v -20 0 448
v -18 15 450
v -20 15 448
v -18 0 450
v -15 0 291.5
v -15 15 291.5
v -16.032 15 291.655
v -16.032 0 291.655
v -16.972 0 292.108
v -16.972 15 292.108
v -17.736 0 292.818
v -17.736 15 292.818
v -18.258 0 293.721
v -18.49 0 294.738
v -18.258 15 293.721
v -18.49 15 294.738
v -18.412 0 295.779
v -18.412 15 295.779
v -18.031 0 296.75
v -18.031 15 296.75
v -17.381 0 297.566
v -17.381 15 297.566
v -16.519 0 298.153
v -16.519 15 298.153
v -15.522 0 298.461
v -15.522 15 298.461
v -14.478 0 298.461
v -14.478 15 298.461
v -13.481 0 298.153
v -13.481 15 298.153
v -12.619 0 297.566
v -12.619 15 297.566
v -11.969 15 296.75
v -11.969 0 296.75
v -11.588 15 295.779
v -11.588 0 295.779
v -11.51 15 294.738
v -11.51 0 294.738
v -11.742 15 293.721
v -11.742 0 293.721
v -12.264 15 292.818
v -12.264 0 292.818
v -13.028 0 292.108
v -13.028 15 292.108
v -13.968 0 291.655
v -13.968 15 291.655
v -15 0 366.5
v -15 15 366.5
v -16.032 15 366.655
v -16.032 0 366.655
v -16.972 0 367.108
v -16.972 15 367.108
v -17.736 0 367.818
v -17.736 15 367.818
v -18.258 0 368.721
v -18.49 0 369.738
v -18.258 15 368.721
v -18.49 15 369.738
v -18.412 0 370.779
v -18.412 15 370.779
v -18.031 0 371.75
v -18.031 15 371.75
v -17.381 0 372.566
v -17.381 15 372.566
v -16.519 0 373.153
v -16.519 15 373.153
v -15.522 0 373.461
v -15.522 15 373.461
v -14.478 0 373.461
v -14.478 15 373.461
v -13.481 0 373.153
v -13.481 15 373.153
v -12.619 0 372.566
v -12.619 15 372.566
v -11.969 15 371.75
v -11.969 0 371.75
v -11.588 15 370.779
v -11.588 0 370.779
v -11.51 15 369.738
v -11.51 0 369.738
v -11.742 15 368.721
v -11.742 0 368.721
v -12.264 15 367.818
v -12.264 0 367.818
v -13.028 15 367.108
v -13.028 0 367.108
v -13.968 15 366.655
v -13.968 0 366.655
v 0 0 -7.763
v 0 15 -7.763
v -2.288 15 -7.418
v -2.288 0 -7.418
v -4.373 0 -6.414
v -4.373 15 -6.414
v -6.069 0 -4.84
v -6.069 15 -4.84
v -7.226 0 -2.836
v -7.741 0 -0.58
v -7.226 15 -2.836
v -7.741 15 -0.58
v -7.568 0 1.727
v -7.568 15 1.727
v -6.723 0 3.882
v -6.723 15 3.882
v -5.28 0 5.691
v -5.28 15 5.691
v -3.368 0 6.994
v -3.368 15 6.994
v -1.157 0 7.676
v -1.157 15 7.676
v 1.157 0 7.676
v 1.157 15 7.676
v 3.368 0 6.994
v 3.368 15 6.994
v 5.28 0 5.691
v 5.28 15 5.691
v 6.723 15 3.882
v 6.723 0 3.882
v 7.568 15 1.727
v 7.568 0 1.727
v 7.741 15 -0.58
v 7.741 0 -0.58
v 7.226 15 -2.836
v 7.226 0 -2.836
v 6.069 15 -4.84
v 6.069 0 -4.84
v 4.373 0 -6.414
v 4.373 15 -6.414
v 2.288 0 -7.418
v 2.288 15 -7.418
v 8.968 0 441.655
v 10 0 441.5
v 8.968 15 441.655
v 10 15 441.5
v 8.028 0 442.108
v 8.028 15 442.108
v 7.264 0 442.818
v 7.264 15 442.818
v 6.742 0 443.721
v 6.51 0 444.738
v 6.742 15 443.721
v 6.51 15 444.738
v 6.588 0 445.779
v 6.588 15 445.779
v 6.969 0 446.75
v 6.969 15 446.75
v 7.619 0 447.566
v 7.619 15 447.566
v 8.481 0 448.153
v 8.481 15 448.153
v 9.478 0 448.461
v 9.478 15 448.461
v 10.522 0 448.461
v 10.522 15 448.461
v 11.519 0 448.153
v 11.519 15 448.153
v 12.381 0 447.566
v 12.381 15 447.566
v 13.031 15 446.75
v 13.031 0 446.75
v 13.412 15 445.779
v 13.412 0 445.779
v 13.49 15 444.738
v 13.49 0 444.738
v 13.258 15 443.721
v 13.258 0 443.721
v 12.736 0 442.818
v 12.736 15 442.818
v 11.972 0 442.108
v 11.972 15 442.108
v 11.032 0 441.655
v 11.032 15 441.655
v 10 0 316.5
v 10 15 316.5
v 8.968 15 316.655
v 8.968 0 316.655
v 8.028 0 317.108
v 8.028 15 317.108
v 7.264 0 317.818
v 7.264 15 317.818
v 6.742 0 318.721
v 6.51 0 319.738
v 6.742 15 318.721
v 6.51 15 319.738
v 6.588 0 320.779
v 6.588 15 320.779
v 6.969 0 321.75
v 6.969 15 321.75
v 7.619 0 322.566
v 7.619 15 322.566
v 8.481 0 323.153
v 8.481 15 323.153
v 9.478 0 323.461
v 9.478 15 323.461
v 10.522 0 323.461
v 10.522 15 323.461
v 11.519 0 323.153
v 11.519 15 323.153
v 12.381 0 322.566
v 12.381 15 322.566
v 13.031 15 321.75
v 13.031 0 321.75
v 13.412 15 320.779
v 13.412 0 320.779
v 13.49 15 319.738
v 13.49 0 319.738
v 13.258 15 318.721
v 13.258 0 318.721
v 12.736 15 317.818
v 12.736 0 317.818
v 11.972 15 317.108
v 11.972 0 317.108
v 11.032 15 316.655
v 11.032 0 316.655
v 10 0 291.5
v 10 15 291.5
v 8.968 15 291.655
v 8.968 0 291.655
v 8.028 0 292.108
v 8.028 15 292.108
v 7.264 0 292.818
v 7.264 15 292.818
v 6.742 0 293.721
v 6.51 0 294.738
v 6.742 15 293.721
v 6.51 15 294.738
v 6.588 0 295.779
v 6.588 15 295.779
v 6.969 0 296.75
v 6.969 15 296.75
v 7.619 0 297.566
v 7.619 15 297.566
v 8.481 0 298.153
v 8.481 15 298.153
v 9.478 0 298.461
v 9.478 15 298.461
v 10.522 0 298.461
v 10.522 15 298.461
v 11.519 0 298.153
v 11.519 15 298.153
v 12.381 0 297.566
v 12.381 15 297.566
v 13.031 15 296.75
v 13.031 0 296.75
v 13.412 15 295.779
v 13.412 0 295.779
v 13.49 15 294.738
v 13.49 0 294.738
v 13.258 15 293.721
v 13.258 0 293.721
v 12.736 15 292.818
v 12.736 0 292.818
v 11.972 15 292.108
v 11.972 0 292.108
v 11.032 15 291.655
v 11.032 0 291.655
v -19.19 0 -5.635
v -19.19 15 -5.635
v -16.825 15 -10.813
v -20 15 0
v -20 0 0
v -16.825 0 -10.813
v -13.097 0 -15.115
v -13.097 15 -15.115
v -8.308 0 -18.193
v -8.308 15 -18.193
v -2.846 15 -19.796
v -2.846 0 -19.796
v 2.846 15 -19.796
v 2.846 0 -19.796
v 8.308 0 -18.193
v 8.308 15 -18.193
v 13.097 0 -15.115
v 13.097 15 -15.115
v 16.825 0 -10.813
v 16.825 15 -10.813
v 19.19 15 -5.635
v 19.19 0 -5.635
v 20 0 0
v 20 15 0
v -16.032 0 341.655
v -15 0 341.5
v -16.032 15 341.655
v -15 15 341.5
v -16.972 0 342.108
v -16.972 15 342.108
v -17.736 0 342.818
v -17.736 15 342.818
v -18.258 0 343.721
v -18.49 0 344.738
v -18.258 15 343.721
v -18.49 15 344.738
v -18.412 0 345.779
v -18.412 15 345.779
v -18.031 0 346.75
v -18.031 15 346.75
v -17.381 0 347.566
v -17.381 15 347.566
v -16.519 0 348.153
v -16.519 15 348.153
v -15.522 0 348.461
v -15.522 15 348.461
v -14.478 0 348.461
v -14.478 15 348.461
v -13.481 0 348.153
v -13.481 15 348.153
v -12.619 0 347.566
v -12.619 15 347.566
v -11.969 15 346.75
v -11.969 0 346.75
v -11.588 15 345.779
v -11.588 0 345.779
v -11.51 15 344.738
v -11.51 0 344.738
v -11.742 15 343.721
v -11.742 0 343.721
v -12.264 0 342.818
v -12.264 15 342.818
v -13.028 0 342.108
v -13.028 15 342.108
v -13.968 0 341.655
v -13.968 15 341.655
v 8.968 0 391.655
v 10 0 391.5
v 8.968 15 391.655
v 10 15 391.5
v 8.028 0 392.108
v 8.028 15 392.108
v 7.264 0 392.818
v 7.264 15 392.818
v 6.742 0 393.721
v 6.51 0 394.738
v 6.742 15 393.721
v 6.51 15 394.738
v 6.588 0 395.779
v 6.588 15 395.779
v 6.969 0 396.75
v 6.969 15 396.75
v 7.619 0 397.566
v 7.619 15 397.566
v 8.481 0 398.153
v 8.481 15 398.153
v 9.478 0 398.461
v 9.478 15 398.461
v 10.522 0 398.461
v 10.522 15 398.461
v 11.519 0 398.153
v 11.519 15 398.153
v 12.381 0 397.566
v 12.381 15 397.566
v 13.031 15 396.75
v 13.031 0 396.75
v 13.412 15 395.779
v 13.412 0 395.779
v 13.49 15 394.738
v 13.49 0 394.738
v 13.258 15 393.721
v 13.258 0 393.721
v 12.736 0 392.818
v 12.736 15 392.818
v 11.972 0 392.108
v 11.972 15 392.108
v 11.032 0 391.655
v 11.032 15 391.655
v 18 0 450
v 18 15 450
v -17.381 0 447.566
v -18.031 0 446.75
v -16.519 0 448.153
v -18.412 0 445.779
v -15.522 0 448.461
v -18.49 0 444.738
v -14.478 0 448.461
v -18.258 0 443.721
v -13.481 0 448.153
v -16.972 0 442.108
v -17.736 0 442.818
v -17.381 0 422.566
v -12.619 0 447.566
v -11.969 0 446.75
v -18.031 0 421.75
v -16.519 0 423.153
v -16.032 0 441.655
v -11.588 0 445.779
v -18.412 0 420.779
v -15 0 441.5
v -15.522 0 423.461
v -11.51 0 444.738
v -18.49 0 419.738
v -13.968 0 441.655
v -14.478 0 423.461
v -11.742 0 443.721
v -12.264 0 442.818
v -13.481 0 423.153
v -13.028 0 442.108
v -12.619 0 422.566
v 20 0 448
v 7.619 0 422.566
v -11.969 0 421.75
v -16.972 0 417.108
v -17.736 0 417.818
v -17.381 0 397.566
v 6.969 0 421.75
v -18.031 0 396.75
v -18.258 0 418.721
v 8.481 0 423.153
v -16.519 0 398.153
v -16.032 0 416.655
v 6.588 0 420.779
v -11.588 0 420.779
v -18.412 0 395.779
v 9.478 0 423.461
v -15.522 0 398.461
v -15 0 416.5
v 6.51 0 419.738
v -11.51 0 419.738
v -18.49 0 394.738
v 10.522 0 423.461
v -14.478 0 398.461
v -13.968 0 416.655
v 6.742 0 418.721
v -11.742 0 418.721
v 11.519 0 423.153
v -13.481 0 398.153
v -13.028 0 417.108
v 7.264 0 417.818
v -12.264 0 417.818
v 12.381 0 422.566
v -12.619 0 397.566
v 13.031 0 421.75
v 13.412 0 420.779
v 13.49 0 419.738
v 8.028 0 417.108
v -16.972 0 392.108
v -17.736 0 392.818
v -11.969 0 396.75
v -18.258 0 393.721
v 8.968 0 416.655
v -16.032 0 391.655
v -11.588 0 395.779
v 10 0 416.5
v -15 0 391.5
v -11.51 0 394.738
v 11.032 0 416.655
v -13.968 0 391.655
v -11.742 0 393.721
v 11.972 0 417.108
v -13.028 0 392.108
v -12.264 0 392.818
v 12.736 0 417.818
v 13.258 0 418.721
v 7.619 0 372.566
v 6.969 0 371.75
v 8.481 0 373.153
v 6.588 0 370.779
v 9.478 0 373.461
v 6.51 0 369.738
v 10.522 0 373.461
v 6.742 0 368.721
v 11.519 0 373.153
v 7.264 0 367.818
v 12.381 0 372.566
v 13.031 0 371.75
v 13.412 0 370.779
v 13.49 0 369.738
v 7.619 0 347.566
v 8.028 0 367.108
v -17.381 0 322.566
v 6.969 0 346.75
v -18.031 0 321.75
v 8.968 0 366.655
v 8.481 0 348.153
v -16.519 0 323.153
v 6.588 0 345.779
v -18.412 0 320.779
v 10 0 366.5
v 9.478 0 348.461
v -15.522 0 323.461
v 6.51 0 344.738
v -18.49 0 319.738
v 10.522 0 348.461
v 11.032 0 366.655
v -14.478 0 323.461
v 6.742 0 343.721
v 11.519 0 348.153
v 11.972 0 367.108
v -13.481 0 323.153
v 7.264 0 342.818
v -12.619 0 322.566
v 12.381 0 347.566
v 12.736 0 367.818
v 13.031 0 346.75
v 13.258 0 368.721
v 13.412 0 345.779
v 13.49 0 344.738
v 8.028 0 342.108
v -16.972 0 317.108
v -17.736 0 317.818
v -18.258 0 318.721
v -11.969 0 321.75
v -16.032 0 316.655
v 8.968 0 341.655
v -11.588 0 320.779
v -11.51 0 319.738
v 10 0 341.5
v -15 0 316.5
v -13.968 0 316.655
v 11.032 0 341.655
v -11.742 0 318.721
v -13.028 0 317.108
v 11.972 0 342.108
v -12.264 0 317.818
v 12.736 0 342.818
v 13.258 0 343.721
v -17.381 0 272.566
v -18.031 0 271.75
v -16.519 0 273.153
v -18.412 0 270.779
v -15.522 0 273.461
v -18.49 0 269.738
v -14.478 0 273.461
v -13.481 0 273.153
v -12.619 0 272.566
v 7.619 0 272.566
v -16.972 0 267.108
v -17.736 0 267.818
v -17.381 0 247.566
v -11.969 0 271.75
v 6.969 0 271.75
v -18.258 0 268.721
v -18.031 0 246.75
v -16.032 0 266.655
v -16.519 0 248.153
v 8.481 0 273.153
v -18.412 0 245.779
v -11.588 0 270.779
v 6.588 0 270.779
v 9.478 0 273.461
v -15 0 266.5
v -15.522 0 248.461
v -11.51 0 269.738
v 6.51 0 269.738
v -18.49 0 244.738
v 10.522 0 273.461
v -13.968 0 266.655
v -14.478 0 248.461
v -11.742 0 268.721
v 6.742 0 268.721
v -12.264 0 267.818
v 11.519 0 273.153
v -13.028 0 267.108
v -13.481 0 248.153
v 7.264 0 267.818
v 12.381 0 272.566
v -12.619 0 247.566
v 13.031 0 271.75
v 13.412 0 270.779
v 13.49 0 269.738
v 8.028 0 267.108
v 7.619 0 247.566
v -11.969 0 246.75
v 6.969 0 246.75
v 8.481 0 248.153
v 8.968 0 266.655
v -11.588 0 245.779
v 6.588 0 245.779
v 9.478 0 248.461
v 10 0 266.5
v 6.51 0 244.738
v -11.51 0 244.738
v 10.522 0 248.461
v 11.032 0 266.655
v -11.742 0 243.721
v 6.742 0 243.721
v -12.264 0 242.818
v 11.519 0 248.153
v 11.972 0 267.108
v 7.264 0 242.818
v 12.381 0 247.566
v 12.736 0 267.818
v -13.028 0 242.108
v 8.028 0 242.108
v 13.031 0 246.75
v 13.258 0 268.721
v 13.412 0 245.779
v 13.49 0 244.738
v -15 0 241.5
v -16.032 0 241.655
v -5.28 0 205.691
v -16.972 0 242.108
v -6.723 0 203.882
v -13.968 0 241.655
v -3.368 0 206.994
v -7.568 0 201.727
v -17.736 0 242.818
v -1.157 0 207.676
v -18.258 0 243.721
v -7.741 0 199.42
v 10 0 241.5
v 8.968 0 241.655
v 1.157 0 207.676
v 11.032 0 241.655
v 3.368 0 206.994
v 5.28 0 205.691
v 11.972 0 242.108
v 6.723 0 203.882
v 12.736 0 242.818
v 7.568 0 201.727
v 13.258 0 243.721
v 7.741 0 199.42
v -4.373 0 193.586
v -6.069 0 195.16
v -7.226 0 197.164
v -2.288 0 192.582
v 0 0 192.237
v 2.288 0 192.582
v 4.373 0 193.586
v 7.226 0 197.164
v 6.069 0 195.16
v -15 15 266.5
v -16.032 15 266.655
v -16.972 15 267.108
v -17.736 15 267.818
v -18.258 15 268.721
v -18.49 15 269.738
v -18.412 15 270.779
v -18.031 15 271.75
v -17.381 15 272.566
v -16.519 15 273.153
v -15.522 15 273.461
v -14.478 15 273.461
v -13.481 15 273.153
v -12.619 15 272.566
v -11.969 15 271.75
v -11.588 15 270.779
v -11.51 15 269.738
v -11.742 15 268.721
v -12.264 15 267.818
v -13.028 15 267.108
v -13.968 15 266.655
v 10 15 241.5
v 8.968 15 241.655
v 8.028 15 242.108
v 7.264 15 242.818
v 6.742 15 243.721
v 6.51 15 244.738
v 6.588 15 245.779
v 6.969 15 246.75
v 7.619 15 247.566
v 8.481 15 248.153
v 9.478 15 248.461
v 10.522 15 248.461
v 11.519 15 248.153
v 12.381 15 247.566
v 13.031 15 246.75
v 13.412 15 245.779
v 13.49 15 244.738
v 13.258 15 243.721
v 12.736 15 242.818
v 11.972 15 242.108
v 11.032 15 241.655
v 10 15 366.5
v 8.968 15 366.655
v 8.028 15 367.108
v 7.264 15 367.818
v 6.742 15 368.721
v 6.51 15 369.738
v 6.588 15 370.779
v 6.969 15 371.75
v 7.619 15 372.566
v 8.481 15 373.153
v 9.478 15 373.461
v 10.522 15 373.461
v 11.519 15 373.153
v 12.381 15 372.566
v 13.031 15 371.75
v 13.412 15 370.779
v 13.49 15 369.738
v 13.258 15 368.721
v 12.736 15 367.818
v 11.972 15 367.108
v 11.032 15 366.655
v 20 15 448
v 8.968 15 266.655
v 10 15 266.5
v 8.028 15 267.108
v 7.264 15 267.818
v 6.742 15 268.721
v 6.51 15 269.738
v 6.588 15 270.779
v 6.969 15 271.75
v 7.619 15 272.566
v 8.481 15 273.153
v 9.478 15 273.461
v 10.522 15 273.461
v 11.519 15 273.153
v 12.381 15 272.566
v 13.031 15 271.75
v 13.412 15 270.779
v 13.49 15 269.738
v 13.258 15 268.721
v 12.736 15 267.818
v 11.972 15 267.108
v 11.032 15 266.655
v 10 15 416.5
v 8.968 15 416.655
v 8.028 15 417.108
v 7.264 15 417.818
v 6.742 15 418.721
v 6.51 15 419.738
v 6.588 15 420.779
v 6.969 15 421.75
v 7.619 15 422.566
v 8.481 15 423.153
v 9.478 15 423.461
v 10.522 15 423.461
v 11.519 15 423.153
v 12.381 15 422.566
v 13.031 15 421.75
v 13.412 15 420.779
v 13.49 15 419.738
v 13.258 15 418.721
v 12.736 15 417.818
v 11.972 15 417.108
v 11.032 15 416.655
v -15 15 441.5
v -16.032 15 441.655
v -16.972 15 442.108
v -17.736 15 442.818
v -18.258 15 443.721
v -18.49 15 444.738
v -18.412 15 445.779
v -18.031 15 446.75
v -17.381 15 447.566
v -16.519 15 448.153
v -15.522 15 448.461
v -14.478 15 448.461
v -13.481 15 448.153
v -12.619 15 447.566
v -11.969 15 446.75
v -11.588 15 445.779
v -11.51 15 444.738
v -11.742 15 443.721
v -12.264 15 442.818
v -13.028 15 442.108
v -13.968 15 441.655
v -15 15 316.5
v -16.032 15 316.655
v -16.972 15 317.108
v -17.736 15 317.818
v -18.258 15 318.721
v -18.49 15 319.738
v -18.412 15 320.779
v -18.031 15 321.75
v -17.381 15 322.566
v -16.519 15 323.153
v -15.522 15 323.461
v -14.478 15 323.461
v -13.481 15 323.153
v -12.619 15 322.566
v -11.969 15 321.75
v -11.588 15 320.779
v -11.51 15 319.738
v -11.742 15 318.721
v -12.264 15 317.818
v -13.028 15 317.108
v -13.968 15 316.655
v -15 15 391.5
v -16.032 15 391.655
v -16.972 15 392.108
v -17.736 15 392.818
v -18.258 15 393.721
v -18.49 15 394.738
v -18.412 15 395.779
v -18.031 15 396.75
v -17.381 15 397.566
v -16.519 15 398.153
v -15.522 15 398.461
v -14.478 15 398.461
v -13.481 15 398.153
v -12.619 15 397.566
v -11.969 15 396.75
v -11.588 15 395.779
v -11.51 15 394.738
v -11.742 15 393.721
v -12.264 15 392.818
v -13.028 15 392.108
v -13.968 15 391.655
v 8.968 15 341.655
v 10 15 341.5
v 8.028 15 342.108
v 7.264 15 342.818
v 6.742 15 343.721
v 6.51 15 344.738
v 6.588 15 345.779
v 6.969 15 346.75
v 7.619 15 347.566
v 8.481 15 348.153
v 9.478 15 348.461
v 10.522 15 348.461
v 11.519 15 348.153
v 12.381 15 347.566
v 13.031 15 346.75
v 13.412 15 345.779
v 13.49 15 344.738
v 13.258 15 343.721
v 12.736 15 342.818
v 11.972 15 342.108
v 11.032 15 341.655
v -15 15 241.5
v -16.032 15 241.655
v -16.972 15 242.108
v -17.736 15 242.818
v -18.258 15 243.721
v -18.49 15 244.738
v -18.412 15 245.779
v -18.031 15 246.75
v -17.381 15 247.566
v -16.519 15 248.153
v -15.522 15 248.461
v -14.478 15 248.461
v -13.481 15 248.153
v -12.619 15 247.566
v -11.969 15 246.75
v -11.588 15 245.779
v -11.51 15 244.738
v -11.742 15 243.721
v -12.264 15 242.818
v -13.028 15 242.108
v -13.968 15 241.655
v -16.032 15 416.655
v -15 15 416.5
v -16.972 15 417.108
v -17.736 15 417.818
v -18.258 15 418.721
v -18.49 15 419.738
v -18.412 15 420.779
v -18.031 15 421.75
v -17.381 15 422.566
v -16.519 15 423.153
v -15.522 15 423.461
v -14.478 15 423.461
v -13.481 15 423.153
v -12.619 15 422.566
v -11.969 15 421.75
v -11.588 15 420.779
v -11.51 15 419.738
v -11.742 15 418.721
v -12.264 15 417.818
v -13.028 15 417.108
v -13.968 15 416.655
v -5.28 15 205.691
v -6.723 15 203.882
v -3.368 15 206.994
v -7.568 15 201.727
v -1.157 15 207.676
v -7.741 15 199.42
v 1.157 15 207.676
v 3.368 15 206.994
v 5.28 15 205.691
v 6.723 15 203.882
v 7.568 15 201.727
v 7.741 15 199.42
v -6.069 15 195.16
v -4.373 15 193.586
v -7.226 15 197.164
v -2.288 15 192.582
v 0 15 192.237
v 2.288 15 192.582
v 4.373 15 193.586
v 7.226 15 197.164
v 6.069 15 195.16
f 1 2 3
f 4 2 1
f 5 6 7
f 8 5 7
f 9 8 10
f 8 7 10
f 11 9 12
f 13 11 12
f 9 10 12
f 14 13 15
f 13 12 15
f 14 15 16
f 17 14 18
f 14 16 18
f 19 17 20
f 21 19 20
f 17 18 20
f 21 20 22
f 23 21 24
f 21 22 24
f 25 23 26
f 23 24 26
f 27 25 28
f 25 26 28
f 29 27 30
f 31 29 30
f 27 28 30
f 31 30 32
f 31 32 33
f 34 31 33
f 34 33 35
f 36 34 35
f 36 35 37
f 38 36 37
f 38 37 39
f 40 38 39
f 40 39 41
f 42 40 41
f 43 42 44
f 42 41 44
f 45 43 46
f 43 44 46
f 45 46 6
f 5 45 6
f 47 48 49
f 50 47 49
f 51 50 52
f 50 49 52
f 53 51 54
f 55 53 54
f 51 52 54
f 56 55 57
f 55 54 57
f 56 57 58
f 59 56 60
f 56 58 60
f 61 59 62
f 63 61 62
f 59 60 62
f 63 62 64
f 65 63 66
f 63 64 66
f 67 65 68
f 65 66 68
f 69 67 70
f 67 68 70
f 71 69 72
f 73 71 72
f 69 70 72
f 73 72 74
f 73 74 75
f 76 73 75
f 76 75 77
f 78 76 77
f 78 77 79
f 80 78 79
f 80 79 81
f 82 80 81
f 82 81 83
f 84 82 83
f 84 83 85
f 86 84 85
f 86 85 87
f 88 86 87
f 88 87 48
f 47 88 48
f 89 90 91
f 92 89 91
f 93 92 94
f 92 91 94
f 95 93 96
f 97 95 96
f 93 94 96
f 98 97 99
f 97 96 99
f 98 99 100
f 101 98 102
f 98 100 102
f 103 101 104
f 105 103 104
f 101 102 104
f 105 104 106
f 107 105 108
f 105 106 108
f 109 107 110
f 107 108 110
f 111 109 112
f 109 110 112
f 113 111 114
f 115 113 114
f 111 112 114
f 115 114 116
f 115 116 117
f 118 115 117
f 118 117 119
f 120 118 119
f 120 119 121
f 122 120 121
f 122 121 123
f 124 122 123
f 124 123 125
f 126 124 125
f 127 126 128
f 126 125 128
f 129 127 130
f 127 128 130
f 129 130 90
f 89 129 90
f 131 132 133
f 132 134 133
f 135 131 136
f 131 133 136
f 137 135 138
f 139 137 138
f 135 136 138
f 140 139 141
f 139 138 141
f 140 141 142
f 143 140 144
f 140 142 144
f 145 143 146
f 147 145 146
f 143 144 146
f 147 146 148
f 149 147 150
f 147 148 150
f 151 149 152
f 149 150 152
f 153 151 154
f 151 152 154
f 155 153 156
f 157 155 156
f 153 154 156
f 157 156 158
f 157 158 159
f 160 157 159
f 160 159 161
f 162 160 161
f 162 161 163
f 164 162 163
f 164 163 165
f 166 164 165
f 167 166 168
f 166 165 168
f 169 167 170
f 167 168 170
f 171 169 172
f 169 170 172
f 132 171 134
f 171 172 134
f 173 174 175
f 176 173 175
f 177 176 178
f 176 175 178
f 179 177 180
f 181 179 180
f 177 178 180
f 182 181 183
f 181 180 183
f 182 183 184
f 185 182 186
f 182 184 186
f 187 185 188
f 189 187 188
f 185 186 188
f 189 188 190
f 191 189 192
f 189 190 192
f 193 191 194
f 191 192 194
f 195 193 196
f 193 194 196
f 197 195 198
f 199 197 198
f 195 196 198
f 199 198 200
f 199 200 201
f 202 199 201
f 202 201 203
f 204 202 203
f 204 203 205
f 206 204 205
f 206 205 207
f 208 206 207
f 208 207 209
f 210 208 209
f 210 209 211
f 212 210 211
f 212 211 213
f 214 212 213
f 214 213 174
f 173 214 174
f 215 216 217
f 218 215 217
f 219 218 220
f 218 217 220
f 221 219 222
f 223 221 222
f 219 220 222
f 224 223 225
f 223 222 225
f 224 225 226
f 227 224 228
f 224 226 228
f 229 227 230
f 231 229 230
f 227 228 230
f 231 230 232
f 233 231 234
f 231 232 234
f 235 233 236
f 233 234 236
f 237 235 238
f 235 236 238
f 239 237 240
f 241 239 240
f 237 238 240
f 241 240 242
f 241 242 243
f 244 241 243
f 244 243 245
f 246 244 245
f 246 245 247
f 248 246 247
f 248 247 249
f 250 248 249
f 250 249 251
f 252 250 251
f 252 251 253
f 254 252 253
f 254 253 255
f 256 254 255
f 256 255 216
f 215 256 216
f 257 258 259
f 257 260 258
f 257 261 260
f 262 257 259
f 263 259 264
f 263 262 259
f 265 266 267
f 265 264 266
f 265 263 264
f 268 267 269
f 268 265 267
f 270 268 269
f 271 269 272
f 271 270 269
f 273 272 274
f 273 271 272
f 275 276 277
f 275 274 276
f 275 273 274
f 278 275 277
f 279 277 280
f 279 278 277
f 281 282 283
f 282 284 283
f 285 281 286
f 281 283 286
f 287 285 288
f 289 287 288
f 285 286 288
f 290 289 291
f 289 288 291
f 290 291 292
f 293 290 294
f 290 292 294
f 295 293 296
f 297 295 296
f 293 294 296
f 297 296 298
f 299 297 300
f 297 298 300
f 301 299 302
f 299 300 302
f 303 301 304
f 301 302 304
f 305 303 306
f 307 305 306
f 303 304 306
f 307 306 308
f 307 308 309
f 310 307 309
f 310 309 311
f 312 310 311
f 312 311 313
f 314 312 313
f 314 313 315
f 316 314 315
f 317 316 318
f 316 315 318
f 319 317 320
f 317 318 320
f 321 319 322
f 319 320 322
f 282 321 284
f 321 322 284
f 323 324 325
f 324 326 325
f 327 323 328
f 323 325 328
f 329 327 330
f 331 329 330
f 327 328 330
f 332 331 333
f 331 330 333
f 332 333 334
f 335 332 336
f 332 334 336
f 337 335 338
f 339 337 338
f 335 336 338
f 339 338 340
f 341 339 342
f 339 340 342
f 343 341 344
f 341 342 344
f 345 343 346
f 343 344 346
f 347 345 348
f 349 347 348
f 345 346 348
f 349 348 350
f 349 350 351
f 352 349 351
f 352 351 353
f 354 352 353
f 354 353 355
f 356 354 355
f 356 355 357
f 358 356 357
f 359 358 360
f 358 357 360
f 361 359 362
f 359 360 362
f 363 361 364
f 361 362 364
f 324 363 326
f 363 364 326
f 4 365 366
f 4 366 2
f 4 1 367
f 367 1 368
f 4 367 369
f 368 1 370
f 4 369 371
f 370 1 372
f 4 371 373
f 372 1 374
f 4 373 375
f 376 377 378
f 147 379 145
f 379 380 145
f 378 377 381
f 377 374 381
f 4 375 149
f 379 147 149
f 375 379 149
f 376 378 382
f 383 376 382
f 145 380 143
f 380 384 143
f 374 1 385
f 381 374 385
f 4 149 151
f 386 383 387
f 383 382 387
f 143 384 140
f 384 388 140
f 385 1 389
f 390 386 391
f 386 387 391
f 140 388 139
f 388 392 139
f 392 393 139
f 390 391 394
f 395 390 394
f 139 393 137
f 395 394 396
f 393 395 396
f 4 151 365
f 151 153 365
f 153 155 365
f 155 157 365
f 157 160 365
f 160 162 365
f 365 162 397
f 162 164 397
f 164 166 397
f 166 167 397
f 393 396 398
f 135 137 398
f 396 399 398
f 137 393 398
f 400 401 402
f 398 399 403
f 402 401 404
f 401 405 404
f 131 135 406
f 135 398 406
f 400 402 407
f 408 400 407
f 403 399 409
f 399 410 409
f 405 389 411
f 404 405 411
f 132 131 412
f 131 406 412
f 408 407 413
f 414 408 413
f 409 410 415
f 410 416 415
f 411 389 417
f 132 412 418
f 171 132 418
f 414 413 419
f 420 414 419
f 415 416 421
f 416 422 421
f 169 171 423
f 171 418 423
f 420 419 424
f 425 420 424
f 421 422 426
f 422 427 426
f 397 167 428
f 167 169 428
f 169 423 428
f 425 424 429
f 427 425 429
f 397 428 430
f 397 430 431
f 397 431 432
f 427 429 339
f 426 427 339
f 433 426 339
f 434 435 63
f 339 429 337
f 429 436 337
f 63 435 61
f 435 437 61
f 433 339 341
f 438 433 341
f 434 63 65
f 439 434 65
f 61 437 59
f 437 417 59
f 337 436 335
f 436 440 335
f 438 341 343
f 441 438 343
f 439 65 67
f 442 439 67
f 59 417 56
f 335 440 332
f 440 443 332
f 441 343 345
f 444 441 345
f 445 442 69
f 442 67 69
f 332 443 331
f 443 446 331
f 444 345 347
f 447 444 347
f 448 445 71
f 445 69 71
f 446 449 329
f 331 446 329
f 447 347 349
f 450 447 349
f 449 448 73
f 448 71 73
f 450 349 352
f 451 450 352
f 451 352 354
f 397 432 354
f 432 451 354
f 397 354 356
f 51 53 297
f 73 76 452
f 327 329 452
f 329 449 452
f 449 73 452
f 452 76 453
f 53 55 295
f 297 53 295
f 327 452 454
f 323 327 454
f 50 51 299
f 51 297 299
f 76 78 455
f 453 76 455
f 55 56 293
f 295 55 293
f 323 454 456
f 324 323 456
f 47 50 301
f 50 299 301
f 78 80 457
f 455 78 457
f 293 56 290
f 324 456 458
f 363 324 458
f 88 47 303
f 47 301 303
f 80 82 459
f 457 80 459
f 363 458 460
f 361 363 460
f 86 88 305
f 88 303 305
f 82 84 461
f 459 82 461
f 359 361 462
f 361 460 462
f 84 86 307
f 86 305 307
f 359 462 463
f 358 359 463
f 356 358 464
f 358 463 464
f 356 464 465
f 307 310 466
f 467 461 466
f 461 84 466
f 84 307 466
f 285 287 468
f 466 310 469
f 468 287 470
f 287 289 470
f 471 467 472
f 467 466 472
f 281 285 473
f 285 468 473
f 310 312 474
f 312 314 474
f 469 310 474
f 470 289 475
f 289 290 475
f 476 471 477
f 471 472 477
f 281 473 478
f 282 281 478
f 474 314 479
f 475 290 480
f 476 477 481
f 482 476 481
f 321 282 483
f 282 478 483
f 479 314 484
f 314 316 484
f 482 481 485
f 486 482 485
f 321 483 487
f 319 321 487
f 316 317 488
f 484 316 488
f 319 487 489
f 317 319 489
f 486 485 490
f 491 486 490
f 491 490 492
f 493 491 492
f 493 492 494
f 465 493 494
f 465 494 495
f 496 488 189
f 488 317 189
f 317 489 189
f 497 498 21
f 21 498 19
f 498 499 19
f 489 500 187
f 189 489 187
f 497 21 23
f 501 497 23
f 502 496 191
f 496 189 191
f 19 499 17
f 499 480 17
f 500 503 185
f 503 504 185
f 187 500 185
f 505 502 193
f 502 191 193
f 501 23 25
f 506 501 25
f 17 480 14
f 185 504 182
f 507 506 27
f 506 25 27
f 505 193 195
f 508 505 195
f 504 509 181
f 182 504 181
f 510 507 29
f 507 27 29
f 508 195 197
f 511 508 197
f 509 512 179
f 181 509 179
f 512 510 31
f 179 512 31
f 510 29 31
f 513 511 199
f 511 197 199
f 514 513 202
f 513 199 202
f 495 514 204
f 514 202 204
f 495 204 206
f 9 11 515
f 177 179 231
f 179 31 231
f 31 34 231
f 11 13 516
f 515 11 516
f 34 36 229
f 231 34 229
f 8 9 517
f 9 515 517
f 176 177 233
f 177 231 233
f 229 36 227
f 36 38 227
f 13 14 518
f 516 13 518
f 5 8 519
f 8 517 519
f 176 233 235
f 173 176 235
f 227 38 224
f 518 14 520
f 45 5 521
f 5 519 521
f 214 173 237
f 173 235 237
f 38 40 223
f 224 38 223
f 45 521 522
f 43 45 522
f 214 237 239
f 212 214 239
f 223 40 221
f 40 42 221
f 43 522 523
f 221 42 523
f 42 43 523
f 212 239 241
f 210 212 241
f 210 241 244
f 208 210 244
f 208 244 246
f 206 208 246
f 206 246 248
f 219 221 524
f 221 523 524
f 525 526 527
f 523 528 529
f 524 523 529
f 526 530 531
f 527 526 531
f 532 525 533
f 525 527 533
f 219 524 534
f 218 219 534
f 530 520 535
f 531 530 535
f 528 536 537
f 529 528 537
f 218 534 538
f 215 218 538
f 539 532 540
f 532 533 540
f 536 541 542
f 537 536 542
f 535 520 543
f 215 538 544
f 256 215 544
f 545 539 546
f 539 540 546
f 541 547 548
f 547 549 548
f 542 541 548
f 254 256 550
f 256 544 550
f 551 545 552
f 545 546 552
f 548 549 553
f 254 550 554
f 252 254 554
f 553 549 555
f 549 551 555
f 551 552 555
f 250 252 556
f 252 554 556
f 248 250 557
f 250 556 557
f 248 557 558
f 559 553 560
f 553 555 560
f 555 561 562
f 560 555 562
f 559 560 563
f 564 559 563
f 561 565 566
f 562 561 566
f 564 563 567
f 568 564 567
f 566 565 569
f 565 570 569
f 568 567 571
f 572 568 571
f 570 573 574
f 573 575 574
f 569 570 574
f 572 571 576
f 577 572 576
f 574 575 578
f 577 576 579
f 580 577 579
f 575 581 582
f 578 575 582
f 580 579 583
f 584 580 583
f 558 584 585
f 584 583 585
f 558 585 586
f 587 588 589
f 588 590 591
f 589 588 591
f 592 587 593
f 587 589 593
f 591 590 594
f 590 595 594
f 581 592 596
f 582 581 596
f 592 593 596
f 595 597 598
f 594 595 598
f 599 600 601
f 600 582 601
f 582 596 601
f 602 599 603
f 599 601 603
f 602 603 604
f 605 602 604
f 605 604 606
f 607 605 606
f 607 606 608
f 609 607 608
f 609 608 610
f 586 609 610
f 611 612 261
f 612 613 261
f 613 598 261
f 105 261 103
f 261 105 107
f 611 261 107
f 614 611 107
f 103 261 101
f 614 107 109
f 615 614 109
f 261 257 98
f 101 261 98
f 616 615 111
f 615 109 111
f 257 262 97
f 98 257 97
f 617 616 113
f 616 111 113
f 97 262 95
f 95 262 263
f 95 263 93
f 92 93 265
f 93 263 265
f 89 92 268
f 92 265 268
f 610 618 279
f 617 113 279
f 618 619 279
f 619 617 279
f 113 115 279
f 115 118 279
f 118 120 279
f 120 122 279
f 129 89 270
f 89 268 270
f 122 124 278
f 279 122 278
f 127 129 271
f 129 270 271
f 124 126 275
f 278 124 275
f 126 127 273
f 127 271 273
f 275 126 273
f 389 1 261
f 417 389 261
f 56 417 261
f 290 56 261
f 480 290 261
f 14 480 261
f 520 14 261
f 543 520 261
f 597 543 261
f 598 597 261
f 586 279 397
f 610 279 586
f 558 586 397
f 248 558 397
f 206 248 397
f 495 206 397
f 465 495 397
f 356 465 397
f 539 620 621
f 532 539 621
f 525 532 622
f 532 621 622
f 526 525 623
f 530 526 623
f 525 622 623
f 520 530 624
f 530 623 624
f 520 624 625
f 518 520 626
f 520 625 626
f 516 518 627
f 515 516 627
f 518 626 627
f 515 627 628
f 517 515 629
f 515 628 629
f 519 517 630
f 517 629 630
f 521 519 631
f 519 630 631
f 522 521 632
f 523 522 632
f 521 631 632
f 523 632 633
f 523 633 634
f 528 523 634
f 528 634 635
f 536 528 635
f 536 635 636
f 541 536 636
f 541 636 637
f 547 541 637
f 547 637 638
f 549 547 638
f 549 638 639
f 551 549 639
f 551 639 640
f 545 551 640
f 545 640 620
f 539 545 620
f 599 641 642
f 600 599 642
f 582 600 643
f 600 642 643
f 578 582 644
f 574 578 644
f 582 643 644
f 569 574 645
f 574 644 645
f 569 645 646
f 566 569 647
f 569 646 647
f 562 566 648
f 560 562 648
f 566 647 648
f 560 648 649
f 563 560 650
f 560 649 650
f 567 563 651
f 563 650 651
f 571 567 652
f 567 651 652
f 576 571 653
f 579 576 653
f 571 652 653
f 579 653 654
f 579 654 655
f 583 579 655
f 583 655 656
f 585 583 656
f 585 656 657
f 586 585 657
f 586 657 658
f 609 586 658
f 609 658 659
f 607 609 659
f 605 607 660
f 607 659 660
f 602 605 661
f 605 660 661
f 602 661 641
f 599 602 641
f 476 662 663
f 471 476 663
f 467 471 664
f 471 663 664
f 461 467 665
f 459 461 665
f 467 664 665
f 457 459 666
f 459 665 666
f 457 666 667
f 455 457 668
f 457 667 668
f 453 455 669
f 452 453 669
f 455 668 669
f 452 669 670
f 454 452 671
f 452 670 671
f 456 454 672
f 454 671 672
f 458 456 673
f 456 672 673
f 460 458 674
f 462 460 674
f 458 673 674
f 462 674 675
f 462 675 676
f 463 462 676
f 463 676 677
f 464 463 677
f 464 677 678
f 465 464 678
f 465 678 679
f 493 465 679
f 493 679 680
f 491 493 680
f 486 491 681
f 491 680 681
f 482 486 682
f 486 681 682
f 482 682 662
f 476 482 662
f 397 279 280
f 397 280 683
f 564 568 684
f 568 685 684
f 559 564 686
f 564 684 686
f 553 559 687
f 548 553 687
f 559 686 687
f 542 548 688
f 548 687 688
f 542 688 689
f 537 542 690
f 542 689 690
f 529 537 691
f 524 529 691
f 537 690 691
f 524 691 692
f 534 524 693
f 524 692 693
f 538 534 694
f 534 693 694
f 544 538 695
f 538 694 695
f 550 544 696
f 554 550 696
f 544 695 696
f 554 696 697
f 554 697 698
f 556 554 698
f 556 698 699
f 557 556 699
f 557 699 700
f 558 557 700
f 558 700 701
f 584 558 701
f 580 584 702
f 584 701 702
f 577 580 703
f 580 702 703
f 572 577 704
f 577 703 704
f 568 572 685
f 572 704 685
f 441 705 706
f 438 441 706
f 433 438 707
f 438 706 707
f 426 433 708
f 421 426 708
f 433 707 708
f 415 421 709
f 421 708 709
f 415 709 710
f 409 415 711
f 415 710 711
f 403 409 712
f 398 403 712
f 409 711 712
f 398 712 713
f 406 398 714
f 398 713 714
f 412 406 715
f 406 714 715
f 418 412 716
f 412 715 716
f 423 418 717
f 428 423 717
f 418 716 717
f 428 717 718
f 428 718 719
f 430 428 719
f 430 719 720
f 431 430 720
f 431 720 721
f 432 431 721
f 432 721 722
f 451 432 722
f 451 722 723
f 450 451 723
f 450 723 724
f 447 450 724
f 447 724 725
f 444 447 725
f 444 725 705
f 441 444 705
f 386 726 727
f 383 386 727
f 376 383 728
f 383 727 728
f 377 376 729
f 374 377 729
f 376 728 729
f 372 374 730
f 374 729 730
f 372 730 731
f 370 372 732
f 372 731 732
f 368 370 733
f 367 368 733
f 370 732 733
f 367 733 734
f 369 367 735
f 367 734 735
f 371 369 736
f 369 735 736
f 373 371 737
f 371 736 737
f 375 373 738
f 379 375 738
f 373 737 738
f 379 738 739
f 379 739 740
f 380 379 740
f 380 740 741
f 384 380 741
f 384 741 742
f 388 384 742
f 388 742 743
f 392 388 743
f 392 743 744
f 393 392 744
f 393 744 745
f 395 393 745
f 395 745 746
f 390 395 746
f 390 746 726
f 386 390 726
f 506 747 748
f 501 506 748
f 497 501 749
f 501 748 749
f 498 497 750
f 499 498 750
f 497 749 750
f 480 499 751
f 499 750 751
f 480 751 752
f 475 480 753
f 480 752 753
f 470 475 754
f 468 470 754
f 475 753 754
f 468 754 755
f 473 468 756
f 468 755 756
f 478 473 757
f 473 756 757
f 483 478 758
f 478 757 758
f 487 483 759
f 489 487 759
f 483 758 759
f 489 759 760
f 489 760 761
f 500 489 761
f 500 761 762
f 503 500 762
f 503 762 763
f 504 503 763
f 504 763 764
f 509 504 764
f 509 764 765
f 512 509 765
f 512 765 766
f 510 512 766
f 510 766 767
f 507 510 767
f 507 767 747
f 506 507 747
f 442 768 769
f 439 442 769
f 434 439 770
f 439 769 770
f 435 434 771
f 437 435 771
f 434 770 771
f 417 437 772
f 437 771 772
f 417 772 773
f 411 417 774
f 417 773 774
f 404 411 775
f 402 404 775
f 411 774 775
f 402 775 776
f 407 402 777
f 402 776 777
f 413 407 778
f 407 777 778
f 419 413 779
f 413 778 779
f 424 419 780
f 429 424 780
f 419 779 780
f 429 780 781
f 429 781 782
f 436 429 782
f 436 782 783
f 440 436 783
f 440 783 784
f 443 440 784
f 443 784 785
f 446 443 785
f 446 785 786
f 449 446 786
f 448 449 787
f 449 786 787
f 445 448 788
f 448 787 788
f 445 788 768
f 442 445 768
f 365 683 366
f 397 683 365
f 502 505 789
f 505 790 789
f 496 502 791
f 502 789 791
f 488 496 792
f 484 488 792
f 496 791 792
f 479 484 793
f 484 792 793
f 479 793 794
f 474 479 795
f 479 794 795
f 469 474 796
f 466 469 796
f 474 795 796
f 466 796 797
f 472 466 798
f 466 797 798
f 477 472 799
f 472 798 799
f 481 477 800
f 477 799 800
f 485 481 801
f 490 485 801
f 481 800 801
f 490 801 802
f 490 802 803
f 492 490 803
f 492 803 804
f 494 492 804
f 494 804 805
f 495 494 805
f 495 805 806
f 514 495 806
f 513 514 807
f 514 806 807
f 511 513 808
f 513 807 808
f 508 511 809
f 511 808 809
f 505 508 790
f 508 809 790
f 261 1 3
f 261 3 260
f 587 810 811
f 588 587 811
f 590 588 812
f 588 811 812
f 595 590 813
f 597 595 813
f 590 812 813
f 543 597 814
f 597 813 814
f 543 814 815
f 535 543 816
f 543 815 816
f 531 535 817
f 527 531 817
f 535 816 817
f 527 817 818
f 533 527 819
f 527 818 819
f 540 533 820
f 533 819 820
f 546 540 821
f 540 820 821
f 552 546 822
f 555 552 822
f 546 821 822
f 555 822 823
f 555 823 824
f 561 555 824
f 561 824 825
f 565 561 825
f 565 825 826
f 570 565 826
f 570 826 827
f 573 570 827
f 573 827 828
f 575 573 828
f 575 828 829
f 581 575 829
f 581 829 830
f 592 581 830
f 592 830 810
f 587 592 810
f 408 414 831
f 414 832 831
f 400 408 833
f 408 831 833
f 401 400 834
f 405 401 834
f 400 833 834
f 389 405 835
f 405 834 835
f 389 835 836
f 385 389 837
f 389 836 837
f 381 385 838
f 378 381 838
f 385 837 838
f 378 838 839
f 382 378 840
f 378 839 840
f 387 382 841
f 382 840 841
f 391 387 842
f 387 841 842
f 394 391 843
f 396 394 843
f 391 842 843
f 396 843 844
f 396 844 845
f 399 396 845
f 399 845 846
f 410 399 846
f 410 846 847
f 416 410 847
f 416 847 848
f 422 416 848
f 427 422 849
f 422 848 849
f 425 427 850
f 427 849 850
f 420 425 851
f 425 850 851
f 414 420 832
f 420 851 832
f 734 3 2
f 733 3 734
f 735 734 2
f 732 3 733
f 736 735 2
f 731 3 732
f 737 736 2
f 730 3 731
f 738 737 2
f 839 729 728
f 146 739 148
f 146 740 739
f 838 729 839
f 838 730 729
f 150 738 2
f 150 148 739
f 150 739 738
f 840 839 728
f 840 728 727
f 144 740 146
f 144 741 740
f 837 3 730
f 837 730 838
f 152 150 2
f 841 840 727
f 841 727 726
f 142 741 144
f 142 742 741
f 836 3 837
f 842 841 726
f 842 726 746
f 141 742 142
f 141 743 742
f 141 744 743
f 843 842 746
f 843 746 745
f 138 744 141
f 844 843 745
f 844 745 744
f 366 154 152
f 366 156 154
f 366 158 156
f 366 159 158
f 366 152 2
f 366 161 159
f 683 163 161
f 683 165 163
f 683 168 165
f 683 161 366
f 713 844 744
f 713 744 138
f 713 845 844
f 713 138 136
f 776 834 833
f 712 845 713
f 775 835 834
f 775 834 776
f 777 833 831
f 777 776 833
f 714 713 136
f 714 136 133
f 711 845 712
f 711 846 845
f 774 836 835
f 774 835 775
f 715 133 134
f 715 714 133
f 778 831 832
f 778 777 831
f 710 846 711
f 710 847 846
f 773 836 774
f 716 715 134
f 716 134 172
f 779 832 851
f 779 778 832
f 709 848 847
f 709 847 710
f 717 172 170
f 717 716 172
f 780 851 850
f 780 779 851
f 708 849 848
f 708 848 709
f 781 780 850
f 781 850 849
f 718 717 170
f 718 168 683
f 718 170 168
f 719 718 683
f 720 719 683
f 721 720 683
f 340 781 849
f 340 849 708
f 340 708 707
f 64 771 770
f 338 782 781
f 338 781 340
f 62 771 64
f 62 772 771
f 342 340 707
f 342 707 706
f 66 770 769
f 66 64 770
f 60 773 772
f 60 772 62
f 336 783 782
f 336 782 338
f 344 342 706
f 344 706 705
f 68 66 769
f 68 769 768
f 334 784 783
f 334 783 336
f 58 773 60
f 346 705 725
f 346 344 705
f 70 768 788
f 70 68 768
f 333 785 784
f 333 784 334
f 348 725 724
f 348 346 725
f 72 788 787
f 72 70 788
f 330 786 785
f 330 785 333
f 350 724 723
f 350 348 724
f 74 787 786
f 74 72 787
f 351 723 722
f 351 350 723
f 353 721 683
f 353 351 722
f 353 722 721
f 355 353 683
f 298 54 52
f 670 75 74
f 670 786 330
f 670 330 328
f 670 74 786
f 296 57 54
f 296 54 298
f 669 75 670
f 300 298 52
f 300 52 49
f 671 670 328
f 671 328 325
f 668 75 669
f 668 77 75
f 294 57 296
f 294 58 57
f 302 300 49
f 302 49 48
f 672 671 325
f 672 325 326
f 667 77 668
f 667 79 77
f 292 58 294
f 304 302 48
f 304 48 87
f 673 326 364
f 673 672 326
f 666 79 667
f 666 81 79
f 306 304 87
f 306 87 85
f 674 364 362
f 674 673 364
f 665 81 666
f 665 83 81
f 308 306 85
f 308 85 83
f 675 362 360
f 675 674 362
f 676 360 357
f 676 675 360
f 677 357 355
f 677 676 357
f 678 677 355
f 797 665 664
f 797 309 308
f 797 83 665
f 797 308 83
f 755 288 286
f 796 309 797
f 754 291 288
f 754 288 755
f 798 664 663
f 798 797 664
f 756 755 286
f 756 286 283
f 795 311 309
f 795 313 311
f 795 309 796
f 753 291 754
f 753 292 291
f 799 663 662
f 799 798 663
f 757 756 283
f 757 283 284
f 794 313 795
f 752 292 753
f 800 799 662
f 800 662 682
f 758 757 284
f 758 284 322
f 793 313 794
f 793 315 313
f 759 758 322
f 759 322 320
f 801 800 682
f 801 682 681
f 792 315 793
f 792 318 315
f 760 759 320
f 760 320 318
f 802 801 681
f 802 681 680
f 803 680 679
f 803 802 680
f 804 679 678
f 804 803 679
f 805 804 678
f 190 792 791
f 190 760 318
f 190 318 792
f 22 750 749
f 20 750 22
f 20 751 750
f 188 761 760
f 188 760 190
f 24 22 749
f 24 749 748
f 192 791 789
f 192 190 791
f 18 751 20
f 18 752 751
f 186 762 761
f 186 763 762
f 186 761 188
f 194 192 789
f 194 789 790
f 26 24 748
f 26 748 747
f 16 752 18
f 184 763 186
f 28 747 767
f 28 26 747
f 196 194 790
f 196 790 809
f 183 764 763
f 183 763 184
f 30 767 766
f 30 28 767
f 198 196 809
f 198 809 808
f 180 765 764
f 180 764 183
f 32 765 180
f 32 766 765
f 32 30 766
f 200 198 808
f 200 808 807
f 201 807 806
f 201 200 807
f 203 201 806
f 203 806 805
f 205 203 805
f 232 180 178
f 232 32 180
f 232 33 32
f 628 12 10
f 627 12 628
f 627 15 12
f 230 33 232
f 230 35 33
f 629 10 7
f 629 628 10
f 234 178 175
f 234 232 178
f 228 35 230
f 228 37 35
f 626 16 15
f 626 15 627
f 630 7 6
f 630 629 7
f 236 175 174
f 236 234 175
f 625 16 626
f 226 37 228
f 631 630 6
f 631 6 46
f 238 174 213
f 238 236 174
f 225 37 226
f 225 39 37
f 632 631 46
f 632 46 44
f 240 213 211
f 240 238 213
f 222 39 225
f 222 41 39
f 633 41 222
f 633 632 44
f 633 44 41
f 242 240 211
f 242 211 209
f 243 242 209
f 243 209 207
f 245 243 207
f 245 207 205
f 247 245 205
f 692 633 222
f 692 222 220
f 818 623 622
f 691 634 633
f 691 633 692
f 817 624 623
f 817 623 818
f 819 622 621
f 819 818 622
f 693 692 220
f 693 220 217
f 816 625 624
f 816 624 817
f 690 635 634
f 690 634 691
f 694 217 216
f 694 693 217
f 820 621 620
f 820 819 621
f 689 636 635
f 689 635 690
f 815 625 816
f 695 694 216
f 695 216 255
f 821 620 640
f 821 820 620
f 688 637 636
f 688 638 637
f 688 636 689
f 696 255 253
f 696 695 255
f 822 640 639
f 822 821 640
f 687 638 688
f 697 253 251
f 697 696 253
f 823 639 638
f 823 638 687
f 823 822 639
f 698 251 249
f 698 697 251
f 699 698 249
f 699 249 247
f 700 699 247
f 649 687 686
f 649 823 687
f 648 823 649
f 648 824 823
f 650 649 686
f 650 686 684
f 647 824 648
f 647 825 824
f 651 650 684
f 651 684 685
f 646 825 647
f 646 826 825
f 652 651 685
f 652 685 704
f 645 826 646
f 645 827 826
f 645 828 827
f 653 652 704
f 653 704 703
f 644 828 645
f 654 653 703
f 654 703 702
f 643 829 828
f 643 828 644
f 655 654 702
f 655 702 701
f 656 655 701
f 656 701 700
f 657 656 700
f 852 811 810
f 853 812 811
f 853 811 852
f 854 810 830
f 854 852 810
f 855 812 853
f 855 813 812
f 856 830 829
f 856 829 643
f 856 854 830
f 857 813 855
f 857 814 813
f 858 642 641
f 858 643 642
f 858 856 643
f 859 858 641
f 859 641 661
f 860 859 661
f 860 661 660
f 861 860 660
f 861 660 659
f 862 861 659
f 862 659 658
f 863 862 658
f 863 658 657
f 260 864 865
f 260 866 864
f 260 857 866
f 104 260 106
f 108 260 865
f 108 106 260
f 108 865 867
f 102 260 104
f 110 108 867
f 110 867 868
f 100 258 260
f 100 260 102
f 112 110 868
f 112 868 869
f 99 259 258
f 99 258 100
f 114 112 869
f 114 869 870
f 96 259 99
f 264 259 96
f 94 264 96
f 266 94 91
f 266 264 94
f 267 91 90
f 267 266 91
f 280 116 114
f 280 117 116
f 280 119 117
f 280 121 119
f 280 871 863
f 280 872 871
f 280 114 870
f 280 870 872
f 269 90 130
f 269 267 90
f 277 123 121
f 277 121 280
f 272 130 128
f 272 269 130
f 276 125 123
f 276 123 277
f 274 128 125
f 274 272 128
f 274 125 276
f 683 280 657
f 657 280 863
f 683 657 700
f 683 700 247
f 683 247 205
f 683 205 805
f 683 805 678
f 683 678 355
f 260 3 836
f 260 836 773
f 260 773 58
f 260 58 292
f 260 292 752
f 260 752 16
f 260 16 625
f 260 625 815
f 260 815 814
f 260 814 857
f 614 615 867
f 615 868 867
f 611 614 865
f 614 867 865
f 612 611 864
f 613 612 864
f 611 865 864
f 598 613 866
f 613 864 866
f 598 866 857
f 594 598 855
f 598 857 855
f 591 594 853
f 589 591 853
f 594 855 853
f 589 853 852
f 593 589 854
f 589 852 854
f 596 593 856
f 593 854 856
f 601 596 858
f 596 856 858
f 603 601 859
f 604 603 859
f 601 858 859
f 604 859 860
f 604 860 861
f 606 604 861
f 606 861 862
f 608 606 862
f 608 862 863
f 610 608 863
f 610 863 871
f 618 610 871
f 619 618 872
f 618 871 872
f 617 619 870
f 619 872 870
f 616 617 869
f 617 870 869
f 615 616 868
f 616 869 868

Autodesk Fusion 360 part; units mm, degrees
sketch "Sketch1" plane through (0, 0, 0) normal (0, 1, 0) x (1, 0, 0)
  line L0 (-20, -450) -> (-20, 0)
  arc A0 (20, 0) -> (-20, 0) centre (0, 0) ccw
  line L1 (20, 0) -> (20, -450)
  line L2 (20, -450) -> (-20, -450)
  point P0 (0, -200)
  point P1 (-15, -245)
  dimension "d1" = 20
  dimension "d2" = 450
  dimension "d3" = 200
  dimension "d9" = 45
  dimension "d10" = 15
extrude "Extrude1" add sketch "Sketch1" along normal blind 15
hole "Hole1" at (0, 0, 200) at (0, 0, 0) direction (0, 1, 0) diameter 15.526 depth 200 tip angle 118
hole "Hole2" at (-15, 0, 245) direction (0, 1, 0) diameter 7 depth 200 tip angle 118
pattern_linear "R-Pattern1" count 11 spacing 25 along (0, 0, 1) count 2 spacing 25 along (1, 0, 0) of "Hole2"
chamfer "Chamfer1" distance 2 angle 45 2 edges at (20, 7.5, 450) (-20, 7.5, 450)
